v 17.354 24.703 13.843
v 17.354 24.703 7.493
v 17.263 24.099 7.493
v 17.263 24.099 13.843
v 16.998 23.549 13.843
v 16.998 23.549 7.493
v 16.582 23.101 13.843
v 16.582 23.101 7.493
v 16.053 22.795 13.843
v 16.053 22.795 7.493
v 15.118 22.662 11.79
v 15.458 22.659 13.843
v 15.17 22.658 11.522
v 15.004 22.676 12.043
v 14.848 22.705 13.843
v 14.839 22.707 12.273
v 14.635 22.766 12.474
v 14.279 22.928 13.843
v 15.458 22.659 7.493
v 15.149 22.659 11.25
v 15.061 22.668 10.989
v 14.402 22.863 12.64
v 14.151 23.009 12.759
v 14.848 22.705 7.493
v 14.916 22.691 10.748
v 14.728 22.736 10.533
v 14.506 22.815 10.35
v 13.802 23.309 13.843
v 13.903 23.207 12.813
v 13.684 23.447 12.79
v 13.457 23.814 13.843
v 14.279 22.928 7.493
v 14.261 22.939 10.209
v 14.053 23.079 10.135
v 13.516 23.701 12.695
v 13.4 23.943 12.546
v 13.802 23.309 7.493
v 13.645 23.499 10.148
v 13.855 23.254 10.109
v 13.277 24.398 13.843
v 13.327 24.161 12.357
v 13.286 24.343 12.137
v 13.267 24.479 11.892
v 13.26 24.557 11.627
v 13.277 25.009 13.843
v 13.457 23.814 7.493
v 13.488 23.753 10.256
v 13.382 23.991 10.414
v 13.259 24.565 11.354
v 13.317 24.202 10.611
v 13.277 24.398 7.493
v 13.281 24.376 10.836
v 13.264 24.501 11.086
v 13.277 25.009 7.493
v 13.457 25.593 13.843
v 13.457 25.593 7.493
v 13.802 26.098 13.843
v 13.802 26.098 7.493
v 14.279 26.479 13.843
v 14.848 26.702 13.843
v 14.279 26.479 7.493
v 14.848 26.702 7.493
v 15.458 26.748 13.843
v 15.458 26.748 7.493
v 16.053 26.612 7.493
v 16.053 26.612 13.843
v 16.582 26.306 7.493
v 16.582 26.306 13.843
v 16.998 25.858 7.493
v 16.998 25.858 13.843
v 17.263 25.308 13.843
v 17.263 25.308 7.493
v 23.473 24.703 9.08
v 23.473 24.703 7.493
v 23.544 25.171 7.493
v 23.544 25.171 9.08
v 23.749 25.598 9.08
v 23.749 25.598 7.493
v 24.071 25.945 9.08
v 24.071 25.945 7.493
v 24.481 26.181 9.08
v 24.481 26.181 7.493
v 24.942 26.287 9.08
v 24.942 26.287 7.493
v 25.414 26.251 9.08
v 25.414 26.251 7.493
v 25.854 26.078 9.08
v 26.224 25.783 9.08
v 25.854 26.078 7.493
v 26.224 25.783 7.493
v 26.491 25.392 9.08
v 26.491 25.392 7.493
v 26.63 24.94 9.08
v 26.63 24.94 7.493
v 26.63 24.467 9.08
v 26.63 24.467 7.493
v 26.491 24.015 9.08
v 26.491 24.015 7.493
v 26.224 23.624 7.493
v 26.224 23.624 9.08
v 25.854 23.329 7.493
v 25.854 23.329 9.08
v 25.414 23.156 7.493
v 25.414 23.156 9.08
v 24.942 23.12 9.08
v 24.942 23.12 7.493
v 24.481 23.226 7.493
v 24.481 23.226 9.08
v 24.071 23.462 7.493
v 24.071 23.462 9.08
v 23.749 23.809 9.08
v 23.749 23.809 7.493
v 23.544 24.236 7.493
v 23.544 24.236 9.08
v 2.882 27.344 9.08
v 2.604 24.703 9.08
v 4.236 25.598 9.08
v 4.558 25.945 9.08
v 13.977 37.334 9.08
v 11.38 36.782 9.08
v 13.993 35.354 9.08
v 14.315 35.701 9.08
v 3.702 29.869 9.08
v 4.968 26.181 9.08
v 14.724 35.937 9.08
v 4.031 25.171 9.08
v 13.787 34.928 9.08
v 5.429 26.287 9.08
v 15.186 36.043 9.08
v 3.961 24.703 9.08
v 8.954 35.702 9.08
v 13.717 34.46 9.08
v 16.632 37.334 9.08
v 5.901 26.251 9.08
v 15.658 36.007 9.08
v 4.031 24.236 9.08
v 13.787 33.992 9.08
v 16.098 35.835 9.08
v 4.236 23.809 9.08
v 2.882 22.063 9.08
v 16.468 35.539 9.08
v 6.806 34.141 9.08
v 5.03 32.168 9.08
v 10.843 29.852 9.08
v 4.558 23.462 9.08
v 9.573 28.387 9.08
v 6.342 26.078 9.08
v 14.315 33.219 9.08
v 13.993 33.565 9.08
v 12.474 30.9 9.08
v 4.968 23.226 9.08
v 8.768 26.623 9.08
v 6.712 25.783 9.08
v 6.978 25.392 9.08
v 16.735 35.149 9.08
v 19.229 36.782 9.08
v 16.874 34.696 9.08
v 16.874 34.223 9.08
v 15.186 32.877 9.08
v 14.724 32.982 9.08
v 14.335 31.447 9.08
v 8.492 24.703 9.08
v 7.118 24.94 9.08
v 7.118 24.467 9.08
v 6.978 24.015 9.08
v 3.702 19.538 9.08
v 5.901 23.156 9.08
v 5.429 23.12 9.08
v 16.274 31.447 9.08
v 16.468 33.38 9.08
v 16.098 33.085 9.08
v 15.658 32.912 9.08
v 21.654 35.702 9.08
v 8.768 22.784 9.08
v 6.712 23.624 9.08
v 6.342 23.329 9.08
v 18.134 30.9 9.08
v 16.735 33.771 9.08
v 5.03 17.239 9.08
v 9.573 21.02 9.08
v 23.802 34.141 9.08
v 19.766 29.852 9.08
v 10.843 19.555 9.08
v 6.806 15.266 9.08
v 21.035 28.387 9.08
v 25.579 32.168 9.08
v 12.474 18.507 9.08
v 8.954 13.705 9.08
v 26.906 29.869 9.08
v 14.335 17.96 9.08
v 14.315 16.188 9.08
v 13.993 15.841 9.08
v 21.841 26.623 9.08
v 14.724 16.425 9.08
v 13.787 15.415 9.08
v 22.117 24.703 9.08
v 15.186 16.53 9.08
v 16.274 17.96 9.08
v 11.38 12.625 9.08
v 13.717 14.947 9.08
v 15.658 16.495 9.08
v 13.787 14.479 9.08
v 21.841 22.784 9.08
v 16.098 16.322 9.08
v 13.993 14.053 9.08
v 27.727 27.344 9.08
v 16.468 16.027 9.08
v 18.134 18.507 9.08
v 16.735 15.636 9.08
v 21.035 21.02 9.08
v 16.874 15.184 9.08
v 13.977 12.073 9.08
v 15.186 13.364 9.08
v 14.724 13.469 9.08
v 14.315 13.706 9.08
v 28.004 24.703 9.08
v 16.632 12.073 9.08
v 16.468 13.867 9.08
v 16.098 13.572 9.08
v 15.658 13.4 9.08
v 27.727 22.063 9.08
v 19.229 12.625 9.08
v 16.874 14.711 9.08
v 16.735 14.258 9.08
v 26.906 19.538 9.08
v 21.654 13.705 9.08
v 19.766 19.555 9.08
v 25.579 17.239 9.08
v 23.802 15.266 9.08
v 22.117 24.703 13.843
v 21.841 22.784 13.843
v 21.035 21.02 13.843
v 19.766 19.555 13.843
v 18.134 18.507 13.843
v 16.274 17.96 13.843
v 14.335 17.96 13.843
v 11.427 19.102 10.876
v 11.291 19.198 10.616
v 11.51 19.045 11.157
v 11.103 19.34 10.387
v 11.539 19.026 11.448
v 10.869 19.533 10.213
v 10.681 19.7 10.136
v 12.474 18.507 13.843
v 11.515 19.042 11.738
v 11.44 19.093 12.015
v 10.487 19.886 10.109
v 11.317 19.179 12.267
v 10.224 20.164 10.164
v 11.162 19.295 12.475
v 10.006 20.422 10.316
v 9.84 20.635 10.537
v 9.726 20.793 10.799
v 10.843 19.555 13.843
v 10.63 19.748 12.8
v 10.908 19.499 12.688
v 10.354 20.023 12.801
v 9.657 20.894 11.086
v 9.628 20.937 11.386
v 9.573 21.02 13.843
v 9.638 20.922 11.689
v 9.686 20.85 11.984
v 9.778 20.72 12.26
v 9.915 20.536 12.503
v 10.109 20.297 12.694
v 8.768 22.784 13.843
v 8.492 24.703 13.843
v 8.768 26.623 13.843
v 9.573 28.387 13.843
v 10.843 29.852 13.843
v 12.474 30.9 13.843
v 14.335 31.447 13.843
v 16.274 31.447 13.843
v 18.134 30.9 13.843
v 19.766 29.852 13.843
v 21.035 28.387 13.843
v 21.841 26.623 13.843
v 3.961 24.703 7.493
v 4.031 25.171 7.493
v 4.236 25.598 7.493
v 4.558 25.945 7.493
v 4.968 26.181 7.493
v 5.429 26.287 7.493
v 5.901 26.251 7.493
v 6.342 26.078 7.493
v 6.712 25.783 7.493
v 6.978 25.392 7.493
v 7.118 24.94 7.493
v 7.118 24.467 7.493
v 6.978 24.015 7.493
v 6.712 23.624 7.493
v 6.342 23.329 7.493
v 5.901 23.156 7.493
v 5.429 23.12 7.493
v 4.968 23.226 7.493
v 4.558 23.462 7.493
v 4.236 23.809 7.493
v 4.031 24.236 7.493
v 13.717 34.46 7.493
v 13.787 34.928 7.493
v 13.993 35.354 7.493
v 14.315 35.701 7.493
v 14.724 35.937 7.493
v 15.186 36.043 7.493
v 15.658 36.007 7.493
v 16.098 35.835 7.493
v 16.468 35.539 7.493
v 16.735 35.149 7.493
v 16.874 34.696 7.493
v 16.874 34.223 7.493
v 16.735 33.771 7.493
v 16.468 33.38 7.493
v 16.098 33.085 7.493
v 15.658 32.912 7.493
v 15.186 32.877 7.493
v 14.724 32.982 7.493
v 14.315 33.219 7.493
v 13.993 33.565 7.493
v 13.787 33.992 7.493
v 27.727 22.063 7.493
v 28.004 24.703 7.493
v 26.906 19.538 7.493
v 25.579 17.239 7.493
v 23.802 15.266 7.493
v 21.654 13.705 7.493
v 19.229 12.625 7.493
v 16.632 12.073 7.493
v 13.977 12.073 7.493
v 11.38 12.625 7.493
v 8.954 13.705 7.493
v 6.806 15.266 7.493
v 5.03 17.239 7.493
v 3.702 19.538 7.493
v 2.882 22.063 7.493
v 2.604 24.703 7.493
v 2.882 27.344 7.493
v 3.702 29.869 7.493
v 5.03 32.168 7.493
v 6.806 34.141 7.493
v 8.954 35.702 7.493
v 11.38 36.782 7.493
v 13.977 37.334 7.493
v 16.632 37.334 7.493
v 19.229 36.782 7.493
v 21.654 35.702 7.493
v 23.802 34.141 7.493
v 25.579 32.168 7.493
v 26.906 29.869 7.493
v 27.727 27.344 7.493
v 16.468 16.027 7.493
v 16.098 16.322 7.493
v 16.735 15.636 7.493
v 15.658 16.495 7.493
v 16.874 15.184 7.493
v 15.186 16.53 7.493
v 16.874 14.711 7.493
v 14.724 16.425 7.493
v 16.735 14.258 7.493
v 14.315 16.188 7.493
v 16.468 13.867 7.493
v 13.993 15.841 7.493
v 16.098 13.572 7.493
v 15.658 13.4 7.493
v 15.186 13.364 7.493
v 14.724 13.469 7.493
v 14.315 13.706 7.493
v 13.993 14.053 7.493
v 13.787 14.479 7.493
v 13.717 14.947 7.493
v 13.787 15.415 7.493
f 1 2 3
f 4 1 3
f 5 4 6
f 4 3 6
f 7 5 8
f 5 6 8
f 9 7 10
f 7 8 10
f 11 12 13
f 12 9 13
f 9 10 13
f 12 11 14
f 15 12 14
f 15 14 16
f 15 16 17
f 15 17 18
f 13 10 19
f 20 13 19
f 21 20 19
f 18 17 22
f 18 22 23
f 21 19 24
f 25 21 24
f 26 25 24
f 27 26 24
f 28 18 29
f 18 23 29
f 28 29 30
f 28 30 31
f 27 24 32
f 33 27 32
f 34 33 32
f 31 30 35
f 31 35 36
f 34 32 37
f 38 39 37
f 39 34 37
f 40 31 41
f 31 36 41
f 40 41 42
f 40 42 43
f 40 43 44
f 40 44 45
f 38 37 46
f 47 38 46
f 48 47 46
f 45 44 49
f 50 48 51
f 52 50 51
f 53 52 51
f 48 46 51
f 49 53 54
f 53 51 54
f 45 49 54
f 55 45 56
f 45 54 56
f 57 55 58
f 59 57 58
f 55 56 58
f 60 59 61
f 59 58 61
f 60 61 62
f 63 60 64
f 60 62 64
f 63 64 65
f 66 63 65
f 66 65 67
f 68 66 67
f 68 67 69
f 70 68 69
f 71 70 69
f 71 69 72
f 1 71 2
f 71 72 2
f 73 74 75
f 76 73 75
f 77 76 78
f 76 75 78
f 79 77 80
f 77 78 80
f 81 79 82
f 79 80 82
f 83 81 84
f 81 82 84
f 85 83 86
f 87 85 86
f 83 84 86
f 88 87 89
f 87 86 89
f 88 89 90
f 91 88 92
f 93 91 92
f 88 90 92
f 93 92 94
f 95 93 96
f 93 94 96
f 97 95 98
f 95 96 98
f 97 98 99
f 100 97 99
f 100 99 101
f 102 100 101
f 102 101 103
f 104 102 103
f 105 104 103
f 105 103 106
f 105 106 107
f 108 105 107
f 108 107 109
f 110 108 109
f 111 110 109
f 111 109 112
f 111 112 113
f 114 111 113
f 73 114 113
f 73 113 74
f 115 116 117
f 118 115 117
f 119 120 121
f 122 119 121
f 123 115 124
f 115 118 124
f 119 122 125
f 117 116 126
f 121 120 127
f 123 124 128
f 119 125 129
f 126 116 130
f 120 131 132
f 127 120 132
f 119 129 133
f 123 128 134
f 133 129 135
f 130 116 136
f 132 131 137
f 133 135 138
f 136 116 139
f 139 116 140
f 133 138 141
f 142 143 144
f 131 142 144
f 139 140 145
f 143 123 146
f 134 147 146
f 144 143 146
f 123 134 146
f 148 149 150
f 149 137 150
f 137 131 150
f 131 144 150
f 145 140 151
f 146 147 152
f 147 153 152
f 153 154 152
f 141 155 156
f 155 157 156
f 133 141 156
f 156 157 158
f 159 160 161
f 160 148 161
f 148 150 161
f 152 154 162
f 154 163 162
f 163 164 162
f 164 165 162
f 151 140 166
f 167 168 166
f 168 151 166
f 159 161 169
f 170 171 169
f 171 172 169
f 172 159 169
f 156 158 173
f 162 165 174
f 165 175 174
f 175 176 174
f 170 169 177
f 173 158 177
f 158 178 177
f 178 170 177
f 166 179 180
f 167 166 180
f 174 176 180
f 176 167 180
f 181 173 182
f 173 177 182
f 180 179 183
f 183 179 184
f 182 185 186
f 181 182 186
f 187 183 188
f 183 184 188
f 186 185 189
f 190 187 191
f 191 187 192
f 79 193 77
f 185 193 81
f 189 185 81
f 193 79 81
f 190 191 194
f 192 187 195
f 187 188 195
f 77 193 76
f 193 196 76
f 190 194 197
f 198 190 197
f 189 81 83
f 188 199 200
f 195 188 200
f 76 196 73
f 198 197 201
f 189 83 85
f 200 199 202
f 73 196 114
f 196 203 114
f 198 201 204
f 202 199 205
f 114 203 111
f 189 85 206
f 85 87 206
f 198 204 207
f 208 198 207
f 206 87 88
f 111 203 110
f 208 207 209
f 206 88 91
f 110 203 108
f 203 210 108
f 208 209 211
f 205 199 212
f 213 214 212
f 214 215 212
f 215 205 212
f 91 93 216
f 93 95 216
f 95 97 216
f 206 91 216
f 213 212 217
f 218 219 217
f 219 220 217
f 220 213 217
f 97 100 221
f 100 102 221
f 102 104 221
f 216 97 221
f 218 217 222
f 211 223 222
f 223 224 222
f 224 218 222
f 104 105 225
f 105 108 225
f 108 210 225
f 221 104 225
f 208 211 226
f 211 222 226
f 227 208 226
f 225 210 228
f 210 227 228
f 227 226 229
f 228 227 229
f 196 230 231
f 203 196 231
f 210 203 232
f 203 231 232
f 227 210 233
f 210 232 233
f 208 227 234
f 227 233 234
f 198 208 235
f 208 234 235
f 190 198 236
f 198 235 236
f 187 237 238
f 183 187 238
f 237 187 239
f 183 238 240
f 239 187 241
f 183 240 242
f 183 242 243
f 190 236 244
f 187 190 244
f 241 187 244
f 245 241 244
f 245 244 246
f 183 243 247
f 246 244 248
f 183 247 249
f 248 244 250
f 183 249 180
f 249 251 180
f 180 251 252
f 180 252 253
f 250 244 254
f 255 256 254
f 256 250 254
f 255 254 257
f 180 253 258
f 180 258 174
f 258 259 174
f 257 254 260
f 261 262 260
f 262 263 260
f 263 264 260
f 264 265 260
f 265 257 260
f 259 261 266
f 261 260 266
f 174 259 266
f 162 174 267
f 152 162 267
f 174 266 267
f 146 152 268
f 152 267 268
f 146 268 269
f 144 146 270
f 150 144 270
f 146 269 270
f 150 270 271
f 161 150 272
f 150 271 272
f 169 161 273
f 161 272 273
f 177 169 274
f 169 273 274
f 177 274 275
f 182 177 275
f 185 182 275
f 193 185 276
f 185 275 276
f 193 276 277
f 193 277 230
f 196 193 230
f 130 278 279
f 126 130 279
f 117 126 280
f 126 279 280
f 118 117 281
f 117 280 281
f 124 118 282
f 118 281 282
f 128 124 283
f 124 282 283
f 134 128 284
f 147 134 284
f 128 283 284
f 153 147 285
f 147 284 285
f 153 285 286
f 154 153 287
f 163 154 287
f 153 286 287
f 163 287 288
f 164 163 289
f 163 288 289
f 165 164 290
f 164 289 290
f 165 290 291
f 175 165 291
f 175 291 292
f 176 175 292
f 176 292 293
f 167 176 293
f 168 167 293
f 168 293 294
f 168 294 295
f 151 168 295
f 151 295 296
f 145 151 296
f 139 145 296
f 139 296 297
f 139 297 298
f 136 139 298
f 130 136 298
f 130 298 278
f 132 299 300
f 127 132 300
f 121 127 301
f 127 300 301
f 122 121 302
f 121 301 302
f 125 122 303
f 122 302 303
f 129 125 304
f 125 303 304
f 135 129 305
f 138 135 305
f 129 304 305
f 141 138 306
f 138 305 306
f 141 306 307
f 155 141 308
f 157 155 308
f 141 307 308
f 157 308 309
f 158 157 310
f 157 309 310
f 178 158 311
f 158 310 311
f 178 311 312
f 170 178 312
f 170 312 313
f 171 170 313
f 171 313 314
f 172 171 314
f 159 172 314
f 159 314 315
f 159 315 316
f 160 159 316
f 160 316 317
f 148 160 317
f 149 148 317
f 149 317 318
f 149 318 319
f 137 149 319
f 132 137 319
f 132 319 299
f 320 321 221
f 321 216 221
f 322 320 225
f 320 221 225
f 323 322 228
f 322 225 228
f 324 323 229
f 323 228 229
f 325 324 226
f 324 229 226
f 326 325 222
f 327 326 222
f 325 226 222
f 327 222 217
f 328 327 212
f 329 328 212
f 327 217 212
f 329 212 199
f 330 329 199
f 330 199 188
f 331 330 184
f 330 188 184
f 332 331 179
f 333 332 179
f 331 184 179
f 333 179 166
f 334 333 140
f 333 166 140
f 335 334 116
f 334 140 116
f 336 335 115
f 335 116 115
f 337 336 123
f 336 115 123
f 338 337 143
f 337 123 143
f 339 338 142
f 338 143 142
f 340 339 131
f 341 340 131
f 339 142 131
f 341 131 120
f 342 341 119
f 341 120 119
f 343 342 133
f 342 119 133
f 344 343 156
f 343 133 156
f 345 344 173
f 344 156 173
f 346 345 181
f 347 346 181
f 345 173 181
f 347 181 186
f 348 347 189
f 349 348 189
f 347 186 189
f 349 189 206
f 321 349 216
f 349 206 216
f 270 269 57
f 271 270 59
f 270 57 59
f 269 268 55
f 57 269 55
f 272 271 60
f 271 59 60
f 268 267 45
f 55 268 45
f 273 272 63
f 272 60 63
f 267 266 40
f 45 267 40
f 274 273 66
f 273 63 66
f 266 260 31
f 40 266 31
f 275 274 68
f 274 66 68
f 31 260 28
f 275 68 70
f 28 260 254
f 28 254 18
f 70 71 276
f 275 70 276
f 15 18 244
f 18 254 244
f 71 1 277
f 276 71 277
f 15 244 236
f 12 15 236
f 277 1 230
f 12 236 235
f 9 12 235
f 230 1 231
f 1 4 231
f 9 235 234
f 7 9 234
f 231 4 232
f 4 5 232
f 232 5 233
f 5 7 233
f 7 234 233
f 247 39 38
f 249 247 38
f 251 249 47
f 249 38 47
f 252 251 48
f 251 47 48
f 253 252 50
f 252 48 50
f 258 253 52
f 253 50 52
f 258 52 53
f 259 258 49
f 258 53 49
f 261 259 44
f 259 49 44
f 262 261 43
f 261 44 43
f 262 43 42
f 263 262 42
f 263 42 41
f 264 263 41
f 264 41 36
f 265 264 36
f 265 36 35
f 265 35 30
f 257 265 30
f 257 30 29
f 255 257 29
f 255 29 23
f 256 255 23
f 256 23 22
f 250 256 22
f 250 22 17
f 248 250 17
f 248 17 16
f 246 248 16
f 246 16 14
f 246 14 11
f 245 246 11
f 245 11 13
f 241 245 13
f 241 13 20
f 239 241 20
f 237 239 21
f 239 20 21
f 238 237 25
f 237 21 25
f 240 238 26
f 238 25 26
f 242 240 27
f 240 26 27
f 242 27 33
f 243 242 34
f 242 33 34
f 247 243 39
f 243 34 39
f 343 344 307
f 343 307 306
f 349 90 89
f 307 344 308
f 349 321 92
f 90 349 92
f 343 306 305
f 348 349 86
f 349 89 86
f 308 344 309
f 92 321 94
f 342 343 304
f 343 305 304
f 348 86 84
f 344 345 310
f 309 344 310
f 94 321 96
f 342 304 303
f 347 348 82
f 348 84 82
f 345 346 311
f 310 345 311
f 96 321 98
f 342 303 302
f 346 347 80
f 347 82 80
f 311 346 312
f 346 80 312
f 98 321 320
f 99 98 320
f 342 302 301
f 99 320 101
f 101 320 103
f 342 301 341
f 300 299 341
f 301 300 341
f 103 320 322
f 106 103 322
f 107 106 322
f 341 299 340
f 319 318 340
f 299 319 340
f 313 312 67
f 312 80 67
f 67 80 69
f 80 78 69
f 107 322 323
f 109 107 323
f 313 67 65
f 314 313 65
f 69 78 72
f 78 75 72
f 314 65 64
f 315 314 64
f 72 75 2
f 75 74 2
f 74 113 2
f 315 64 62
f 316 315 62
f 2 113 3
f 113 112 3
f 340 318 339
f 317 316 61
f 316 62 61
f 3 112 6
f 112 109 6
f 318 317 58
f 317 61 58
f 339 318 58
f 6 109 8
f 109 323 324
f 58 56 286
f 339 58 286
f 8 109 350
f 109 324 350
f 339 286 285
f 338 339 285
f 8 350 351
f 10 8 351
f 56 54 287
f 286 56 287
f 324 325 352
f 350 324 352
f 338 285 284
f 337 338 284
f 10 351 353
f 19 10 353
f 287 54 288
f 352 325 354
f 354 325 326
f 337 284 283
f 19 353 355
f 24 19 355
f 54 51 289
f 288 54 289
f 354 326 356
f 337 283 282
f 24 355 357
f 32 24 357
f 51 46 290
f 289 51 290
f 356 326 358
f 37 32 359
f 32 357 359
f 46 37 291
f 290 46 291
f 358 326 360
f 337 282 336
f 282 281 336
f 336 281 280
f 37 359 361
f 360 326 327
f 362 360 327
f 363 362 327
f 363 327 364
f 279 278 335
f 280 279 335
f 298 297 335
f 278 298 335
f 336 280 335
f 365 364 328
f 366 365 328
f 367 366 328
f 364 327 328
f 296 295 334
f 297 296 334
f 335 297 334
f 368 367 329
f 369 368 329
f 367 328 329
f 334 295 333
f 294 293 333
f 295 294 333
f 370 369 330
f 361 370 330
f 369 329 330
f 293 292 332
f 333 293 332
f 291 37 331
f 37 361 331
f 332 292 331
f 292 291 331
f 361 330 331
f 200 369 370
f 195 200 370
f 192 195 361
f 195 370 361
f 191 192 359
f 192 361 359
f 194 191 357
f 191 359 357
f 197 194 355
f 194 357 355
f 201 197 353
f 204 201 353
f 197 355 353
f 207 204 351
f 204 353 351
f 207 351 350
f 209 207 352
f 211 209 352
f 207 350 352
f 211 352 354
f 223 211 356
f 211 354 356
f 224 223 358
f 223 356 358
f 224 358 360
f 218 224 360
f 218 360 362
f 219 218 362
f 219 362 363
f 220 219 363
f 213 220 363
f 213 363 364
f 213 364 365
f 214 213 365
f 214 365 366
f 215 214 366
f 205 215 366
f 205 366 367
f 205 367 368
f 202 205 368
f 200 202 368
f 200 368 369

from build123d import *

# Parameters (mm, degrees)
F_1_8_0_125_DIAMETER_HOLE1_D = 3.175
F_6_32_TAPPED_HOLE1_D        = 2.7051
F_6_32_TAPPED_HOLE1_DEPTH    = 6.858
F_6_32_TAPPED_HOLE1_TIP      = 0.81269403


with BuildPart() as part:
    # Sketch1 → Revolve1 (revolve)
    with BuildSketch(Plane(origin=(15.304322218, 0, 0), x_dir=(0, 0, -1), z_dir=(1, 0, 0)), mode=Mode.PRIVATE) as revolve1_sk:
        Polygon((-7.493, 22.653467802), (-7.493, 12.003467802), (-9.0805, 12.003467802), (-9.0805, 17.890967802), (-13.843, 17.890967802), (-13.843, 22.653467802), align=None)
    revolve(revolve1_sk.sketch.rotate(Axis((15.304322218, 24.703467802, 13.843), (0, 0, -1)), 270), axis=Axis((15.304322218, 24.703467802, 13.843), (0, 0, -1)))

    # 1/8 (0.125) Diameter Hole1 (through all)
    with Locations(Plane.XY.offset(9.0805)):
        with Locations((15.304322218, 14.947217802), (25.060572218, 24.703467802), (15.304322218, 34.459717802), (5.548072218, 24.703467802)):
            Hole(F_1_8_0_125_DIAMETER_HOLE1_D / 2)

    # #6-32 Tapped Hole1
    with Locations(Plane(origin=(15.186730063, 15.186730063, 0), x_dir=(0, 0, 1), z_dir=(-0.7071067811865488, -0.7071067811865464, 0))):
        with Locations((11.46175, 6.646199579)):
            Hole(F_6_32_TAPPED_HOLE1_D / 2, depth=F_6_32_TAPPED_HOLE1_DEPTH)
            with Locations((0, 0, -(F_6_32_TAPPED_HOLE1_DEPTH + F_6_32_TAPPED_HOLE1_TIP / 2))):  # 118° drill point
                Cone(0, F_6_32_TAPPED_HOLE1_D / 2, F_6_32_TAPPED_HOLE1_TIP, mode=Mode.SUBTRACT)


solid = part.part
